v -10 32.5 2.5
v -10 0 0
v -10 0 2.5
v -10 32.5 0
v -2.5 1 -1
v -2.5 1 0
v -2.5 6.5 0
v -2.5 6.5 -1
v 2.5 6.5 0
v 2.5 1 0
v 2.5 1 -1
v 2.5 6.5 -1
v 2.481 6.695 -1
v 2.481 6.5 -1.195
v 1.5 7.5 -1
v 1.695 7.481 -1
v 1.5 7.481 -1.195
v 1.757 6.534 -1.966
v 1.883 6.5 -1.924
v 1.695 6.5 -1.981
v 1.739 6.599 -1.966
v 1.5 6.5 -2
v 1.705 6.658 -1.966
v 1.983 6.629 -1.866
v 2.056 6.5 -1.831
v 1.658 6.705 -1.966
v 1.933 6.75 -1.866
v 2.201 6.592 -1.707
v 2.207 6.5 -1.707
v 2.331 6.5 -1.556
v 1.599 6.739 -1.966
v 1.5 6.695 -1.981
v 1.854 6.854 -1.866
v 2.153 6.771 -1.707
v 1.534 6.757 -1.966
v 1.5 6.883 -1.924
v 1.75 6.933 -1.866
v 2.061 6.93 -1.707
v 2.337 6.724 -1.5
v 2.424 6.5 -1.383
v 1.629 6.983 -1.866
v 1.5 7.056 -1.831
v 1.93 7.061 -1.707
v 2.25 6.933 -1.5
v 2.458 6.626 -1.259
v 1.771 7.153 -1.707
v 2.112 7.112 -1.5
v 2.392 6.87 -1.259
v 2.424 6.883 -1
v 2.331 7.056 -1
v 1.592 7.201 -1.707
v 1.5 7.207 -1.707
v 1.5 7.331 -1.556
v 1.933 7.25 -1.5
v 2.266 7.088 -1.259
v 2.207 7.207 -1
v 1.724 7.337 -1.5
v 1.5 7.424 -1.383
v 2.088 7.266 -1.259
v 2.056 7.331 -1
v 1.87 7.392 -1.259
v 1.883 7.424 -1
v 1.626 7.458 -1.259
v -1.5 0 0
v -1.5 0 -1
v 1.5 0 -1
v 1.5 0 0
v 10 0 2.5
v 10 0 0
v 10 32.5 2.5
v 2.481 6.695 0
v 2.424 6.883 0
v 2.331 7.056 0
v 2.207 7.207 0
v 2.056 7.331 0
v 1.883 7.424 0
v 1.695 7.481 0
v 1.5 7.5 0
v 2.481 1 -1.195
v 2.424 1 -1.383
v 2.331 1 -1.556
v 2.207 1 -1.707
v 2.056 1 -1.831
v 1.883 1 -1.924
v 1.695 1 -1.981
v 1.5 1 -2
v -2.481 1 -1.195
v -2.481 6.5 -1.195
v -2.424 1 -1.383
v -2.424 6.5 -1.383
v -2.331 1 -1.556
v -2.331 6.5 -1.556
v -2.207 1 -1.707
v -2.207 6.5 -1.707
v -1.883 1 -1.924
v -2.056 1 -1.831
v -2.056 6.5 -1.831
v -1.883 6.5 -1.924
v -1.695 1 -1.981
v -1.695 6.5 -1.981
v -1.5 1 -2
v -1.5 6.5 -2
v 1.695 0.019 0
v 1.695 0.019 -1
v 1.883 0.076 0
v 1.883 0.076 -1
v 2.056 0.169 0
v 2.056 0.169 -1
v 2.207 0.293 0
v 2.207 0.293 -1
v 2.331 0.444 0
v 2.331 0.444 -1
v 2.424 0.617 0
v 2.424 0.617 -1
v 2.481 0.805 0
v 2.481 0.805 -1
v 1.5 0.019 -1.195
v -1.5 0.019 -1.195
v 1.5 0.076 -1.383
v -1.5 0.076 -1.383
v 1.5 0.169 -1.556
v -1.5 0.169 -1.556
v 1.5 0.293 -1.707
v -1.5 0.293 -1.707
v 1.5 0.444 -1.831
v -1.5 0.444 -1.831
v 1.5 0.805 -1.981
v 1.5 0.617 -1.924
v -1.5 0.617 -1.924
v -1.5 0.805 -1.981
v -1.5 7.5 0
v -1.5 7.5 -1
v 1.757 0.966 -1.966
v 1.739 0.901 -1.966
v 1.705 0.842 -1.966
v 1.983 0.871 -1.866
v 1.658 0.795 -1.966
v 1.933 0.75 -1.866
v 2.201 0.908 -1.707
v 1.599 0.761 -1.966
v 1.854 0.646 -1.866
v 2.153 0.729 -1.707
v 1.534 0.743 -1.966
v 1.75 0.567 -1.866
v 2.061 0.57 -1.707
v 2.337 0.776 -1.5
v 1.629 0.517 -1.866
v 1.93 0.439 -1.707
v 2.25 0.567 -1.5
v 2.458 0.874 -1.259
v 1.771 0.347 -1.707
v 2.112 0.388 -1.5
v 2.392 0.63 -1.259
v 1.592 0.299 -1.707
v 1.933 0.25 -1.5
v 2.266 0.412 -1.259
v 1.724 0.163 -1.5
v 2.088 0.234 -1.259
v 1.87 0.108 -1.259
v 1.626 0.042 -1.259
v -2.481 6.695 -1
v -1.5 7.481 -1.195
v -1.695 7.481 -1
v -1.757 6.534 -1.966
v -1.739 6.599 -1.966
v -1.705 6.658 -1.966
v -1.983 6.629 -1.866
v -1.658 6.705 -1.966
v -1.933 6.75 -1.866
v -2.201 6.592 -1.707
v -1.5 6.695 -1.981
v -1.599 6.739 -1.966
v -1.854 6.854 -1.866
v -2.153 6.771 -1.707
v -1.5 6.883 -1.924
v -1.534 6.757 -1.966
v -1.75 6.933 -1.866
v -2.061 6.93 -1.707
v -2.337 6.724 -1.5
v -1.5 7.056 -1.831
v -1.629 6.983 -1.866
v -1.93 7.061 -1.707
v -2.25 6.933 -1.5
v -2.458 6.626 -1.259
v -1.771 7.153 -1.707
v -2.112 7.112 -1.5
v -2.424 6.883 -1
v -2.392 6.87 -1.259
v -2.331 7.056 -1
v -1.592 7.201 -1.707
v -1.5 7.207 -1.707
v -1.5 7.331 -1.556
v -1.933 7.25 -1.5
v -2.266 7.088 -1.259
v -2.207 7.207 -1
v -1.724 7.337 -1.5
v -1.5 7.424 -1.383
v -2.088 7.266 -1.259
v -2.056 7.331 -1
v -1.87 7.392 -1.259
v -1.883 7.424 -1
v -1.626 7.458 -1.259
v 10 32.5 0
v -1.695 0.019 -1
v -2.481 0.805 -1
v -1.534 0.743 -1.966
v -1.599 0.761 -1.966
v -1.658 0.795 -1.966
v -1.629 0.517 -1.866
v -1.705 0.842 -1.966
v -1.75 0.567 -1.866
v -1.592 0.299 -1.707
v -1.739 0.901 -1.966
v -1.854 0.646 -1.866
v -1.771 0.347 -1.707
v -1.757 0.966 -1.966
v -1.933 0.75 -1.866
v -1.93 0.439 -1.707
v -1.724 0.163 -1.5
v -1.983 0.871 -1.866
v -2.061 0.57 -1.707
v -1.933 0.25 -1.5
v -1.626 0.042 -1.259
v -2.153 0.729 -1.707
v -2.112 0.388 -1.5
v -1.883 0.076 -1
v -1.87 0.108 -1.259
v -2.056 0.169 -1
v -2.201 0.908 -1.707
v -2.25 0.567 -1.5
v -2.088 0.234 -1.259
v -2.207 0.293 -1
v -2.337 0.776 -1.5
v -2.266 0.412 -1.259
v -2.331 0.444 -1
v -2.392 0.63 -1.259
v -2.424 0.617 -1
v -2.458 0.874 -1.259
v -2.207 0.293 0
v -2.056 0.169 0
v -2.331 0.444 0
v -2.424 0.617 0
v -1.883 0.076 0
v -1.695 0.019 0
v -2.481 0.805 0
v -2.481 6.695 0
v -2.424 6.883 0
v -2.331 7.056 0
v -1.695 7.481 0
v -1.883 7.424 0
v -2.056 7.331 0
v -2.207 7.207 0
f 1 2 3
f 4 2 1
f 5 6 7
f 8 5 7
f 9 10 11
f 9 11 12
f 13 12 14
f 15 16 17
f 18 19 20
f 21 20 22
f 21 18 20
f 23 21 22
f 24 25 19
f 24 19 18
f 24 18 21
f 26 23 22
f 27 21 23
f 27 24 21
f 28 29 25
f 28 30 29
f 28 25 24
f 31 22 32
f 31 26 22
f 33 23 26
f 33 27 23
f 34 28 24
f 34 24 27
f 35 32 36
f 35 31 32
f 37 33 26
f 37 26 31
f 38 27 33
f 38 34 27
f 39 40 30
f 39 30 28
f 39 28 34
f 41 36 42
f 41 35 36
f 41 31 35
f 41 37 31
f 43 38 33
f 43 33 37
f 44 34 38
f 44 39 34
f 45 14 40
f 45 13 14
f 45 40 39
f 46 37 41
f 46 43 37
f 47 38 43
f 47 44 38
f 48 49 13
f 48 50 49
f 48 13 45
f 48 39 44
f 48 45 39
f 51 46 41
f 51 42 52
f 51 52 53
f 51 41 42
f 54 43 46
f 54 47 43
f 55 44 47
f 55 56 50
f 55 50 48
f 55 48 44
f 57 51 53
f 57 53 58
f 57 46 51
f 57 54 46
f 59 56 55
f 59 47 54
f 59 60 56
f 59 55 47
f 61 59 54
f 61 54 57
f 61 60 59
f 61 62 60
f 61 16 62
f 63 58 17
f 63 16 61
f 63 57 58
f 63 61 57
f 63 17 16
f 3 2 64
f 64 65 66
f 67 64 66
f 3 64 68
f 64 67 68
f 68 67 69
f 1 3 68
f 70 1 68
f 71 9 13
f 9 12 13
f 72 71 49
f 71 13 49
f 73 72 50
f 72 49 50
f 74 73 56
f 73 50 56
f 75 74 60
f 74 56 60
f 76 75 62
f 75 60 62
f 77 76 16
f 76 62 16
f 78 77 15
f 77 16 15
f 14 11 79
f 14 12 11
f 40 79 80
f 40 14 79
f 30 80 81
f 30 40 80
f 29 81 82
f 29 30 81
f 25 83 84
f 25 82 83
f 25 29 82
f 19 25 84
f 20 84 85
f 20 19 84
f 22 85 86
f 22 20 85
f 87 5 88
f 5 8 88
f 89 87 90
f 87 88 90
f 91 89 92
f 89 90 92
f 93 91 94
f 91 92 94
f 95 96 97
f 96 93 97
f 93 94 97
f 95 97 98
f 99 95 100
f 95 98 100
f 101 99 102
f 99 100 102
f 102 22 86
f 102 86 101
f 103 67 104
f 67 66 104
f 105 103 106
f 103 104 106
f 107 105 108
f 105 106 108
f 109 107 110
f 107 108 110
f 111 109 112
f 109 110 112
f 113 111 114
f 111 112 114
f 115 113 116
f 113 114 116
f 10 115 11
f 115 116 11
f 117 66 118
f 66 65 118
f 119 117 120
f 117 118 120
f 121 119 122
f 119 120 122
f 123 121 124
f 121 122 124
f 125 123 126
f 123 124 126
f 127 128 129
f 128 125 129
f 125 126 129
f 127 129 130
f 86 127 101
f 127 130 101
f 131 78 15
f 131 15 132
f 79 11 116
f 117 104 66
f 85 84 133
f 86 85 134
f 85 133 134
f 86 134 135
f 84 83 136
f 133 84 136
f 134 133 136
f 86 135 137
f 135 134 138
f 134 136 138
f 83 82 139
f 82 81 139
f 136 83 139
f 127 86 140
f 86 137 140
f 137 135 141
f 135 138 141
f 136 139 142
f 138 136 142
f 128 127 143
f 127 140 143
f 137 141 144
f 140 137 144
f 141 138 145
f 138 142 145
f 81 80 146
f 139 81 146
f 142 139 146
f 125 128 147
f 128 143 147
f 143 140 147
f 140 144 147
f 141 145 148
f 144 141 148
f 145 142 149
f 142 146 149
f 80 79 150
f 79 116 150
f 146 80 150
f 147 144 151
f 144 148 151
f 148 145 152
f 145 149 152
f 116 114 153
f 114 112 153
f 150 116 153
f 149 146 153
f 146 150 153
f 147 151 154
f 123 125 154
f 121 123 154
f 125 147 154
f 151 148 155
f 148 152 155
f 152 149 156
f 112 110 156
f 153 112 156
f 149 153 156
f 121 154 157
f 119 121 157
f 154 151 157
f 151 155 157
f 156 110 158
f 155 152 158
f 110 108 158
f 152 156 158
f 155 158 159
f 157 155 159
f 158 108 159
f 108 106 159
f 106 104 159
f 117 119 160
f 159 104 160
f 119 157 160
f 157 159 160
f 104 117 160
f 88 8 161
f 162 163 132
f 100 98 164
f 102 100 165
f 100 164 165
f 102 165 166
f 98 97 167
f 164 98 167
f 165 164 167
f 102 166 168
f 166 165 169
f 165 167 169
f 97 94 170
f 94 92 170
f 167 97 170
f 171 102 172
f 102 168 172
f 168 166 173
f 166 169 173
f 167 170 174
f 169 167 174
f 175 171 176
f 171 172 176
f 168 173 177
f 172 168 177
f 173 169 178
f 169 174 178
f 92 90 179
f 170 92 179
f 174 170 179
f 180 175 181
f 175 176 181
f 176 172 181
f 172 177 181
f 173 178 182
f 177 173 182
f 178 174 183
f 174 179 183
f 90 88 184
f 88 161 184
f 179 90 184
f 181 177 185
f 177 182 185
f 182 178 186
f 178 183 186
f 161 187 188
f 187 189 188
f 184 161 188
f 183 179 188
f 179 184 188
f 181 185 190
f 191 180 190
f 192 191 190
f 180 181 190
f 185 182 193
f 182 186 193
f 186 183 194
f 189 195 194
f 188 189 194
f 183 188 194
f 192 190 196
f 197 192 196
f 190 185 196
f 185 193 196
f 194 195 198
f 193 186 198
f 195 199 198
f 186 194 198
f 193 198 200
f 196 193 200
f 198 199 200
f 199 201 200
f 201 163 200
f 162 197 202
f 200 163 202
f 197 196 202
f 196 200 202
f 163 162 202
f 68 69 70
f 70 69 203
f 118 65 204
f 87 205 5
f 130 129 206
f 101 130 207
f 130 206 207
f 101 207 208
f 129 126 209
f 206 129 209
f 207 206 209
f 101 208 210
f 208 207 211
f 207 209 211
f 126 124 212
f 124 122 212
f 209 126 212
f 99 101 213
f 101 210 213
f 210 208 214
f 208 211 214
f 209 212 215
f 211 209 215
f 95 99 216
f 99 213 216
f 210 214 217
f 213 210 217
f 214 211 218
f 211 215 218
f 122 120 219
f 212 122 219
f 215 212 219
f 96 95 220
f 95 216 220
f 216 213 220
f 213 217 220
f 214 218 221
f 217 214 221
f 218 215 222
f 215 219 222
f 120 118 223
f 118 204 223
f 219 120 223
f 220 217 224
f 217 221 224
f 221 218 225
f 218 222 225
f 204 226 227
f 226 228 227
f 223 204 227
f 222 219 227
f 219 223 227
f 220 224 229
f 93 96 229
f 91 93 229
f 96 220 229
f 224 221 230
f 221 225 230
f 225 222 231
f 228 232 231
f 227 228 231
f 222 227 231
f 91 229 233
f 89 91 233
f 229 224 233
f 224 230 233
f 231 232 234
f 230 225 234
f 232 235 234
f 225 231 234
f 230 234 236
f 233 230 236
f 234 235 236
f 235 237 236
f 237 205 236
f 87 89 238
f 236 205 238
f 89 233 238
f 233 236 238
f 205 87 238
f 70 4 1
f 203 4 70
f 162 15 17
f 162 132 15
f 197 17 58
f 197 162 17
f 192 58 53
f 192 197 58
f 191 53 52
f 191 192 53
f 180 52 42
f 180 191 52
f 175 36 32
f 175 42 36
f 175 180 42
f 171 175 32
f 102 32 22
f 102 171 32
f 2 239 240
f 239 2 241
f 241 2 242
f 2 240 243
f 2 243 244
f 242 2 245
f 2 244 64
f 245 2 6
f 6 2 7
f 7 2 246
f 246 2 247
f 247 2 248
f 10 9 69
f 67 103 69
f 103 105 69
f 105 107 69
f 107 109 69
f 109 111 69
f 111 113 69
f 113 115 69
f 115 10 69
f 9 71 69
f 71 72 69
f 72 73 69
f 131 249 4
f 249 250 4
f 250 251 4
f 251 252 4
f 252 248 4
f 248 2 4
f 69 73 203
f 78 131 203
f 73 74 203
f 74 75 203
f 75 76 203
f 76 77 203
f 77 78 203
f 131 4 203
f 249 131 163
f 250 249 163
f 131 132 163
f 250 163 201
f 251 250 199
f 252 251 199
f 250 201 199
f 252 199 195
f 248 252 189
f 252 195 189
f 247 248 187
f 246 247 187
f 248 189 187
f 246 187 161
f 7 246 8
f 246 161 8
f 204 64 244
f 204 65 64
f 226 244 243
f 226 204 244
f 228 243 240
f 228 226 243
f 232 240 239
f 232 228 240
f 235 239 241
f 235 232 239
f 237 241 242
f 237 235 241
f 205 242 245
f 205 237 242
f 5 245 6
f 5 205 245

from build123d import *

# Parameters (mm, degrees)
SKETCH1_W           = 20
SKETCH1_H           = 32.5
BOSS_EXTRUDE1_DEPTH = 2.5
SKETCH2_W           = 5
SKETCH2_H           = 7.5
BOSS_EXTRUDE2_DEPTH = 2
FILLET1_R           = 1


with BuildPart() as part:
    # Sketch1 → Boss-Extrude1 (new body)
    with BuildSketch(Plane.XY):
        with Locations((0, 16.25)):
            Rectangle(SKETCH1_W, SKETCH1_H)
    extrude(amount=BOSS_EXTRUDE1_DEPTH)

    # Sketch2 → Boss-Extrude2 (add)
    with BuildSketch(Plane(origin=(0, 0, 0), x_dir=(-1, 0, 0), z_dir=(0, 0, -1))):
        with Locations((0, 3.75)):
            Rectangle(SKETCH2_W, SKETCH2_H)
    extrude(amount=BOSS_EXTRUDE2_DEPTH)

    # Fillet1
    fillet1_edges = [part.edges().sort_by_distance(p)[0] for p in [
        (2.5, 7.5, -1),
        (2.5, 0, -1),
        (-2.5, 0, -1),
        (-2.5, 7.5, -1),
        (2.5, 3.75, -2),
        (0, 0, -2),
        (-2.5, 3.75, -2),
        (0, 7.5, -2),
    ]]
    fillet(fillet1_edges, radius=FILLET1_R)


solid = part.part
